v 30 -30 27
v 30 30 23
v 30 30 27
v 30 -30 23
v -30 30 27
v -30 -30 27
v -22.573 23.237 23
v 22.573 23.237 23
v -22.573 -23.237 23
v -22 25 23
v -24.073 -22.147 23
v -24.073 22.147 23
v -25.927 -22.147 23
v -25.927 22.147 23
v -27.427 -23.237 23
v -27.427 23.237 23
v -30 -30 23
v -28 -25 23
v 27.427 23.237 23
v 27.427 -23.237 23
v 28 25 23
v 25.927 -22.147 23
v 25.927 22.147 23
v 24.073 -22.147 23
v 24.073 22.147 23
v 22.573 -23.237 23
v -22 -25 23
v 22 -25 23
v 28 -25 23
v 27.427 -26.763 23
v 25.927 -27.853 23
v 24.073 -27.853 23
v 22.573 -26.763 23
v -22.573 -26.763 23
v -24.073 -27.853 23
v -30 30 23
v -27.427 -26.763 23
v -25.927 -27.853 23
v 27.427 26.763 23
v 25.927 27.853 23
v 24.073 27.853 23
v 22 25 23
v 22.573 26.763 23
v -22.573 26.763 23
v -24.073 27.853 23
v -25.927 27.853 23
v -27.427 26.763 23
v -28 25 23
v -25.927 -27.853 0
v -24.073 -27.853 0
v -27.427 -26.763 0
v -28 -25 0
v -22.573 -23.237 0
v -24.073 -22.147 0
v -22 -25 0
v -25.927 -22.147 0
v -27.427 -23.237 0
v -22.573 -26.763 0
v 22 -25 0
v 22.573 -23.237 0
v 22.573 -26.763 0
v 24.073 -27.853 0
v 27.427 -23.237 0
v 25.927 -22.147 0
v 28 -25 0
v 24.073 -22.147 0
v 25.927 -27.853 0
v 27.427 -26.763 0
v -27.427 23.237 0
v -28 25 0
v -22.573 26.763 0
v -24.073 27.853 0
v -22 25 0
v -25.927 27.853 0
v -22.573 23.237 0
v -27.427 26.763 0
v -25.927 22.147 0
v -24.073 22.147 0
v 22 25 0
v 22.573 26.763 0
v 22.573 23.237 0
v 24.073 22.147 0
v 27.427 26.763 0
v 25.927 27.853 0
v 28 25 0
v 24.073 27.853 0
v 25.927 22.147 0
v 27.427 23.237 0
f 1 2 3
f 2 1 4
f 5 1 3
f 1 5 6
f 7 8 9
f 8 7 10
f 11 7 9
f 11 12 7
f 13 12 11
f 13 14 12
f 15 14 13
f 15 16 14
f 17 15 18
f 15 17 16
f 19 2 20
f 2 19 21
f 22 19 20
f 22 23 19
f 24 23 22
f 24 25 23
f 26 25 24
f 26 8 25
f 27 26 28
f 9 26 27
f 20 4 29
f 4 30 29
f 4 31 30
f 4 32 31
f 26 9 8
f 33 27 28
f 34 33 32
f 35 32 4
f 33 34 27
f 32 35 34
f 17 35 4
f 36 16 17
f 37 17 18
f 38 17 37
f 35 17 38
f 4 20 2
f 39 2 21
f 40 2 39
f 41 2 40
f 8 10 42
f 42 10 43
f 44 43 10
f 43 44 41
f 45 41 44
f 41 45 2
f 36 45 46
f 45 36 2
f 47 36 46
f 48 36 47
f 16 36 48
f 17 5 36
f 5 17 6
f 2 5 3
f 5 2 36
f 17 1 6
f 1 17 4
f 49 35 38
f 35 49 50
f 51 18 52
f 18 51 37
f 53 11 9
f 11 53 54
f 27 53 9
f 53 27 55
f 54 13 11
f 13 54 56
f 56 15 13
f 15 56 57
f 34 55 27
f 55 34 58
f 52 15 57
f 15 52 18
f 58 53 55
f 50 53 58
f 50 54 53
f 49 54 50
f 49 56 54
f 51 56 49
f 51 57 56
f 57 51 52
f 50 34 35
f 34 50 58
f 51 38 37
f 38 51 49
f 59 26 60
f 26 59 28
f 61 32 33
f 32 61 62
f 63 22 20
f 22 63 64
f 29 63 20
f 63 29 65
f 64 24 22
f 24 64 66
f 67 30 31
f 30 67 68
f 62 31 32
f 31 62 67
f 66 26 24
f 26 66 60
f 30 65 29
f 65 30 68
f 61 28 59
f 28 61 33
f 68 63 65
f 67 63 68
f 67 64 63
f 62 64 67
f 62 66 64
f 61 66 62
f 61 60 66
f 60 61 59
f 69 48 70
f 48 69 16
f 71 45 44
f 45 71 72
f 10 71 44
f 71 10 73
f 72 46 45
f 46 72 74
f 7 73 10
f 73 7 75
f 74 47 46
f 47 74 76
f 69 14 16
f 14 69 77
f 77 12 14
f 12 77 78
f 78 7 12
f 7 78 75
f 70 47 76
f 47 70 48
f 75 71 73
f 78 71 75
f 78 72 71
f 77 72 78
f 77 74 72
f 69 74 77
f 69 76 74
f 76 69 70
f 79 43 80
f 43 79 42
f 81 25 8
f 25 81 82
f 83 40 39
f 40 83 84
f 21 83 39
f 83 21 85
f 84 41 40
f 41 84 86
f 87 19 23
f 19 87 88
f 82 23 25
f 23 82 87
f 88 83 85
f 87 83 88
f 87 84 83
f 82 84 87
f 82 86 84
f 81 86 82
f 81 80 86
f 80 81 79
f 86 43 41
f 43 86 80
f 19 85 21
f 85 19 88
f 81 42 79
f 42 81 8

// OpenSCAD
union() {
  translate([0,0,25]) cube([60,60,4], center=true);
  translate([-25,-25,0]) cylinder(h=25, r=3);
  translate([25,-25,0]) cylinder(h=25, r=3);
  translate([-25,25,0]) cylinder(h=25, r=3);
  translate([25,25,0]) cylinder(h=25, r=3);
}
